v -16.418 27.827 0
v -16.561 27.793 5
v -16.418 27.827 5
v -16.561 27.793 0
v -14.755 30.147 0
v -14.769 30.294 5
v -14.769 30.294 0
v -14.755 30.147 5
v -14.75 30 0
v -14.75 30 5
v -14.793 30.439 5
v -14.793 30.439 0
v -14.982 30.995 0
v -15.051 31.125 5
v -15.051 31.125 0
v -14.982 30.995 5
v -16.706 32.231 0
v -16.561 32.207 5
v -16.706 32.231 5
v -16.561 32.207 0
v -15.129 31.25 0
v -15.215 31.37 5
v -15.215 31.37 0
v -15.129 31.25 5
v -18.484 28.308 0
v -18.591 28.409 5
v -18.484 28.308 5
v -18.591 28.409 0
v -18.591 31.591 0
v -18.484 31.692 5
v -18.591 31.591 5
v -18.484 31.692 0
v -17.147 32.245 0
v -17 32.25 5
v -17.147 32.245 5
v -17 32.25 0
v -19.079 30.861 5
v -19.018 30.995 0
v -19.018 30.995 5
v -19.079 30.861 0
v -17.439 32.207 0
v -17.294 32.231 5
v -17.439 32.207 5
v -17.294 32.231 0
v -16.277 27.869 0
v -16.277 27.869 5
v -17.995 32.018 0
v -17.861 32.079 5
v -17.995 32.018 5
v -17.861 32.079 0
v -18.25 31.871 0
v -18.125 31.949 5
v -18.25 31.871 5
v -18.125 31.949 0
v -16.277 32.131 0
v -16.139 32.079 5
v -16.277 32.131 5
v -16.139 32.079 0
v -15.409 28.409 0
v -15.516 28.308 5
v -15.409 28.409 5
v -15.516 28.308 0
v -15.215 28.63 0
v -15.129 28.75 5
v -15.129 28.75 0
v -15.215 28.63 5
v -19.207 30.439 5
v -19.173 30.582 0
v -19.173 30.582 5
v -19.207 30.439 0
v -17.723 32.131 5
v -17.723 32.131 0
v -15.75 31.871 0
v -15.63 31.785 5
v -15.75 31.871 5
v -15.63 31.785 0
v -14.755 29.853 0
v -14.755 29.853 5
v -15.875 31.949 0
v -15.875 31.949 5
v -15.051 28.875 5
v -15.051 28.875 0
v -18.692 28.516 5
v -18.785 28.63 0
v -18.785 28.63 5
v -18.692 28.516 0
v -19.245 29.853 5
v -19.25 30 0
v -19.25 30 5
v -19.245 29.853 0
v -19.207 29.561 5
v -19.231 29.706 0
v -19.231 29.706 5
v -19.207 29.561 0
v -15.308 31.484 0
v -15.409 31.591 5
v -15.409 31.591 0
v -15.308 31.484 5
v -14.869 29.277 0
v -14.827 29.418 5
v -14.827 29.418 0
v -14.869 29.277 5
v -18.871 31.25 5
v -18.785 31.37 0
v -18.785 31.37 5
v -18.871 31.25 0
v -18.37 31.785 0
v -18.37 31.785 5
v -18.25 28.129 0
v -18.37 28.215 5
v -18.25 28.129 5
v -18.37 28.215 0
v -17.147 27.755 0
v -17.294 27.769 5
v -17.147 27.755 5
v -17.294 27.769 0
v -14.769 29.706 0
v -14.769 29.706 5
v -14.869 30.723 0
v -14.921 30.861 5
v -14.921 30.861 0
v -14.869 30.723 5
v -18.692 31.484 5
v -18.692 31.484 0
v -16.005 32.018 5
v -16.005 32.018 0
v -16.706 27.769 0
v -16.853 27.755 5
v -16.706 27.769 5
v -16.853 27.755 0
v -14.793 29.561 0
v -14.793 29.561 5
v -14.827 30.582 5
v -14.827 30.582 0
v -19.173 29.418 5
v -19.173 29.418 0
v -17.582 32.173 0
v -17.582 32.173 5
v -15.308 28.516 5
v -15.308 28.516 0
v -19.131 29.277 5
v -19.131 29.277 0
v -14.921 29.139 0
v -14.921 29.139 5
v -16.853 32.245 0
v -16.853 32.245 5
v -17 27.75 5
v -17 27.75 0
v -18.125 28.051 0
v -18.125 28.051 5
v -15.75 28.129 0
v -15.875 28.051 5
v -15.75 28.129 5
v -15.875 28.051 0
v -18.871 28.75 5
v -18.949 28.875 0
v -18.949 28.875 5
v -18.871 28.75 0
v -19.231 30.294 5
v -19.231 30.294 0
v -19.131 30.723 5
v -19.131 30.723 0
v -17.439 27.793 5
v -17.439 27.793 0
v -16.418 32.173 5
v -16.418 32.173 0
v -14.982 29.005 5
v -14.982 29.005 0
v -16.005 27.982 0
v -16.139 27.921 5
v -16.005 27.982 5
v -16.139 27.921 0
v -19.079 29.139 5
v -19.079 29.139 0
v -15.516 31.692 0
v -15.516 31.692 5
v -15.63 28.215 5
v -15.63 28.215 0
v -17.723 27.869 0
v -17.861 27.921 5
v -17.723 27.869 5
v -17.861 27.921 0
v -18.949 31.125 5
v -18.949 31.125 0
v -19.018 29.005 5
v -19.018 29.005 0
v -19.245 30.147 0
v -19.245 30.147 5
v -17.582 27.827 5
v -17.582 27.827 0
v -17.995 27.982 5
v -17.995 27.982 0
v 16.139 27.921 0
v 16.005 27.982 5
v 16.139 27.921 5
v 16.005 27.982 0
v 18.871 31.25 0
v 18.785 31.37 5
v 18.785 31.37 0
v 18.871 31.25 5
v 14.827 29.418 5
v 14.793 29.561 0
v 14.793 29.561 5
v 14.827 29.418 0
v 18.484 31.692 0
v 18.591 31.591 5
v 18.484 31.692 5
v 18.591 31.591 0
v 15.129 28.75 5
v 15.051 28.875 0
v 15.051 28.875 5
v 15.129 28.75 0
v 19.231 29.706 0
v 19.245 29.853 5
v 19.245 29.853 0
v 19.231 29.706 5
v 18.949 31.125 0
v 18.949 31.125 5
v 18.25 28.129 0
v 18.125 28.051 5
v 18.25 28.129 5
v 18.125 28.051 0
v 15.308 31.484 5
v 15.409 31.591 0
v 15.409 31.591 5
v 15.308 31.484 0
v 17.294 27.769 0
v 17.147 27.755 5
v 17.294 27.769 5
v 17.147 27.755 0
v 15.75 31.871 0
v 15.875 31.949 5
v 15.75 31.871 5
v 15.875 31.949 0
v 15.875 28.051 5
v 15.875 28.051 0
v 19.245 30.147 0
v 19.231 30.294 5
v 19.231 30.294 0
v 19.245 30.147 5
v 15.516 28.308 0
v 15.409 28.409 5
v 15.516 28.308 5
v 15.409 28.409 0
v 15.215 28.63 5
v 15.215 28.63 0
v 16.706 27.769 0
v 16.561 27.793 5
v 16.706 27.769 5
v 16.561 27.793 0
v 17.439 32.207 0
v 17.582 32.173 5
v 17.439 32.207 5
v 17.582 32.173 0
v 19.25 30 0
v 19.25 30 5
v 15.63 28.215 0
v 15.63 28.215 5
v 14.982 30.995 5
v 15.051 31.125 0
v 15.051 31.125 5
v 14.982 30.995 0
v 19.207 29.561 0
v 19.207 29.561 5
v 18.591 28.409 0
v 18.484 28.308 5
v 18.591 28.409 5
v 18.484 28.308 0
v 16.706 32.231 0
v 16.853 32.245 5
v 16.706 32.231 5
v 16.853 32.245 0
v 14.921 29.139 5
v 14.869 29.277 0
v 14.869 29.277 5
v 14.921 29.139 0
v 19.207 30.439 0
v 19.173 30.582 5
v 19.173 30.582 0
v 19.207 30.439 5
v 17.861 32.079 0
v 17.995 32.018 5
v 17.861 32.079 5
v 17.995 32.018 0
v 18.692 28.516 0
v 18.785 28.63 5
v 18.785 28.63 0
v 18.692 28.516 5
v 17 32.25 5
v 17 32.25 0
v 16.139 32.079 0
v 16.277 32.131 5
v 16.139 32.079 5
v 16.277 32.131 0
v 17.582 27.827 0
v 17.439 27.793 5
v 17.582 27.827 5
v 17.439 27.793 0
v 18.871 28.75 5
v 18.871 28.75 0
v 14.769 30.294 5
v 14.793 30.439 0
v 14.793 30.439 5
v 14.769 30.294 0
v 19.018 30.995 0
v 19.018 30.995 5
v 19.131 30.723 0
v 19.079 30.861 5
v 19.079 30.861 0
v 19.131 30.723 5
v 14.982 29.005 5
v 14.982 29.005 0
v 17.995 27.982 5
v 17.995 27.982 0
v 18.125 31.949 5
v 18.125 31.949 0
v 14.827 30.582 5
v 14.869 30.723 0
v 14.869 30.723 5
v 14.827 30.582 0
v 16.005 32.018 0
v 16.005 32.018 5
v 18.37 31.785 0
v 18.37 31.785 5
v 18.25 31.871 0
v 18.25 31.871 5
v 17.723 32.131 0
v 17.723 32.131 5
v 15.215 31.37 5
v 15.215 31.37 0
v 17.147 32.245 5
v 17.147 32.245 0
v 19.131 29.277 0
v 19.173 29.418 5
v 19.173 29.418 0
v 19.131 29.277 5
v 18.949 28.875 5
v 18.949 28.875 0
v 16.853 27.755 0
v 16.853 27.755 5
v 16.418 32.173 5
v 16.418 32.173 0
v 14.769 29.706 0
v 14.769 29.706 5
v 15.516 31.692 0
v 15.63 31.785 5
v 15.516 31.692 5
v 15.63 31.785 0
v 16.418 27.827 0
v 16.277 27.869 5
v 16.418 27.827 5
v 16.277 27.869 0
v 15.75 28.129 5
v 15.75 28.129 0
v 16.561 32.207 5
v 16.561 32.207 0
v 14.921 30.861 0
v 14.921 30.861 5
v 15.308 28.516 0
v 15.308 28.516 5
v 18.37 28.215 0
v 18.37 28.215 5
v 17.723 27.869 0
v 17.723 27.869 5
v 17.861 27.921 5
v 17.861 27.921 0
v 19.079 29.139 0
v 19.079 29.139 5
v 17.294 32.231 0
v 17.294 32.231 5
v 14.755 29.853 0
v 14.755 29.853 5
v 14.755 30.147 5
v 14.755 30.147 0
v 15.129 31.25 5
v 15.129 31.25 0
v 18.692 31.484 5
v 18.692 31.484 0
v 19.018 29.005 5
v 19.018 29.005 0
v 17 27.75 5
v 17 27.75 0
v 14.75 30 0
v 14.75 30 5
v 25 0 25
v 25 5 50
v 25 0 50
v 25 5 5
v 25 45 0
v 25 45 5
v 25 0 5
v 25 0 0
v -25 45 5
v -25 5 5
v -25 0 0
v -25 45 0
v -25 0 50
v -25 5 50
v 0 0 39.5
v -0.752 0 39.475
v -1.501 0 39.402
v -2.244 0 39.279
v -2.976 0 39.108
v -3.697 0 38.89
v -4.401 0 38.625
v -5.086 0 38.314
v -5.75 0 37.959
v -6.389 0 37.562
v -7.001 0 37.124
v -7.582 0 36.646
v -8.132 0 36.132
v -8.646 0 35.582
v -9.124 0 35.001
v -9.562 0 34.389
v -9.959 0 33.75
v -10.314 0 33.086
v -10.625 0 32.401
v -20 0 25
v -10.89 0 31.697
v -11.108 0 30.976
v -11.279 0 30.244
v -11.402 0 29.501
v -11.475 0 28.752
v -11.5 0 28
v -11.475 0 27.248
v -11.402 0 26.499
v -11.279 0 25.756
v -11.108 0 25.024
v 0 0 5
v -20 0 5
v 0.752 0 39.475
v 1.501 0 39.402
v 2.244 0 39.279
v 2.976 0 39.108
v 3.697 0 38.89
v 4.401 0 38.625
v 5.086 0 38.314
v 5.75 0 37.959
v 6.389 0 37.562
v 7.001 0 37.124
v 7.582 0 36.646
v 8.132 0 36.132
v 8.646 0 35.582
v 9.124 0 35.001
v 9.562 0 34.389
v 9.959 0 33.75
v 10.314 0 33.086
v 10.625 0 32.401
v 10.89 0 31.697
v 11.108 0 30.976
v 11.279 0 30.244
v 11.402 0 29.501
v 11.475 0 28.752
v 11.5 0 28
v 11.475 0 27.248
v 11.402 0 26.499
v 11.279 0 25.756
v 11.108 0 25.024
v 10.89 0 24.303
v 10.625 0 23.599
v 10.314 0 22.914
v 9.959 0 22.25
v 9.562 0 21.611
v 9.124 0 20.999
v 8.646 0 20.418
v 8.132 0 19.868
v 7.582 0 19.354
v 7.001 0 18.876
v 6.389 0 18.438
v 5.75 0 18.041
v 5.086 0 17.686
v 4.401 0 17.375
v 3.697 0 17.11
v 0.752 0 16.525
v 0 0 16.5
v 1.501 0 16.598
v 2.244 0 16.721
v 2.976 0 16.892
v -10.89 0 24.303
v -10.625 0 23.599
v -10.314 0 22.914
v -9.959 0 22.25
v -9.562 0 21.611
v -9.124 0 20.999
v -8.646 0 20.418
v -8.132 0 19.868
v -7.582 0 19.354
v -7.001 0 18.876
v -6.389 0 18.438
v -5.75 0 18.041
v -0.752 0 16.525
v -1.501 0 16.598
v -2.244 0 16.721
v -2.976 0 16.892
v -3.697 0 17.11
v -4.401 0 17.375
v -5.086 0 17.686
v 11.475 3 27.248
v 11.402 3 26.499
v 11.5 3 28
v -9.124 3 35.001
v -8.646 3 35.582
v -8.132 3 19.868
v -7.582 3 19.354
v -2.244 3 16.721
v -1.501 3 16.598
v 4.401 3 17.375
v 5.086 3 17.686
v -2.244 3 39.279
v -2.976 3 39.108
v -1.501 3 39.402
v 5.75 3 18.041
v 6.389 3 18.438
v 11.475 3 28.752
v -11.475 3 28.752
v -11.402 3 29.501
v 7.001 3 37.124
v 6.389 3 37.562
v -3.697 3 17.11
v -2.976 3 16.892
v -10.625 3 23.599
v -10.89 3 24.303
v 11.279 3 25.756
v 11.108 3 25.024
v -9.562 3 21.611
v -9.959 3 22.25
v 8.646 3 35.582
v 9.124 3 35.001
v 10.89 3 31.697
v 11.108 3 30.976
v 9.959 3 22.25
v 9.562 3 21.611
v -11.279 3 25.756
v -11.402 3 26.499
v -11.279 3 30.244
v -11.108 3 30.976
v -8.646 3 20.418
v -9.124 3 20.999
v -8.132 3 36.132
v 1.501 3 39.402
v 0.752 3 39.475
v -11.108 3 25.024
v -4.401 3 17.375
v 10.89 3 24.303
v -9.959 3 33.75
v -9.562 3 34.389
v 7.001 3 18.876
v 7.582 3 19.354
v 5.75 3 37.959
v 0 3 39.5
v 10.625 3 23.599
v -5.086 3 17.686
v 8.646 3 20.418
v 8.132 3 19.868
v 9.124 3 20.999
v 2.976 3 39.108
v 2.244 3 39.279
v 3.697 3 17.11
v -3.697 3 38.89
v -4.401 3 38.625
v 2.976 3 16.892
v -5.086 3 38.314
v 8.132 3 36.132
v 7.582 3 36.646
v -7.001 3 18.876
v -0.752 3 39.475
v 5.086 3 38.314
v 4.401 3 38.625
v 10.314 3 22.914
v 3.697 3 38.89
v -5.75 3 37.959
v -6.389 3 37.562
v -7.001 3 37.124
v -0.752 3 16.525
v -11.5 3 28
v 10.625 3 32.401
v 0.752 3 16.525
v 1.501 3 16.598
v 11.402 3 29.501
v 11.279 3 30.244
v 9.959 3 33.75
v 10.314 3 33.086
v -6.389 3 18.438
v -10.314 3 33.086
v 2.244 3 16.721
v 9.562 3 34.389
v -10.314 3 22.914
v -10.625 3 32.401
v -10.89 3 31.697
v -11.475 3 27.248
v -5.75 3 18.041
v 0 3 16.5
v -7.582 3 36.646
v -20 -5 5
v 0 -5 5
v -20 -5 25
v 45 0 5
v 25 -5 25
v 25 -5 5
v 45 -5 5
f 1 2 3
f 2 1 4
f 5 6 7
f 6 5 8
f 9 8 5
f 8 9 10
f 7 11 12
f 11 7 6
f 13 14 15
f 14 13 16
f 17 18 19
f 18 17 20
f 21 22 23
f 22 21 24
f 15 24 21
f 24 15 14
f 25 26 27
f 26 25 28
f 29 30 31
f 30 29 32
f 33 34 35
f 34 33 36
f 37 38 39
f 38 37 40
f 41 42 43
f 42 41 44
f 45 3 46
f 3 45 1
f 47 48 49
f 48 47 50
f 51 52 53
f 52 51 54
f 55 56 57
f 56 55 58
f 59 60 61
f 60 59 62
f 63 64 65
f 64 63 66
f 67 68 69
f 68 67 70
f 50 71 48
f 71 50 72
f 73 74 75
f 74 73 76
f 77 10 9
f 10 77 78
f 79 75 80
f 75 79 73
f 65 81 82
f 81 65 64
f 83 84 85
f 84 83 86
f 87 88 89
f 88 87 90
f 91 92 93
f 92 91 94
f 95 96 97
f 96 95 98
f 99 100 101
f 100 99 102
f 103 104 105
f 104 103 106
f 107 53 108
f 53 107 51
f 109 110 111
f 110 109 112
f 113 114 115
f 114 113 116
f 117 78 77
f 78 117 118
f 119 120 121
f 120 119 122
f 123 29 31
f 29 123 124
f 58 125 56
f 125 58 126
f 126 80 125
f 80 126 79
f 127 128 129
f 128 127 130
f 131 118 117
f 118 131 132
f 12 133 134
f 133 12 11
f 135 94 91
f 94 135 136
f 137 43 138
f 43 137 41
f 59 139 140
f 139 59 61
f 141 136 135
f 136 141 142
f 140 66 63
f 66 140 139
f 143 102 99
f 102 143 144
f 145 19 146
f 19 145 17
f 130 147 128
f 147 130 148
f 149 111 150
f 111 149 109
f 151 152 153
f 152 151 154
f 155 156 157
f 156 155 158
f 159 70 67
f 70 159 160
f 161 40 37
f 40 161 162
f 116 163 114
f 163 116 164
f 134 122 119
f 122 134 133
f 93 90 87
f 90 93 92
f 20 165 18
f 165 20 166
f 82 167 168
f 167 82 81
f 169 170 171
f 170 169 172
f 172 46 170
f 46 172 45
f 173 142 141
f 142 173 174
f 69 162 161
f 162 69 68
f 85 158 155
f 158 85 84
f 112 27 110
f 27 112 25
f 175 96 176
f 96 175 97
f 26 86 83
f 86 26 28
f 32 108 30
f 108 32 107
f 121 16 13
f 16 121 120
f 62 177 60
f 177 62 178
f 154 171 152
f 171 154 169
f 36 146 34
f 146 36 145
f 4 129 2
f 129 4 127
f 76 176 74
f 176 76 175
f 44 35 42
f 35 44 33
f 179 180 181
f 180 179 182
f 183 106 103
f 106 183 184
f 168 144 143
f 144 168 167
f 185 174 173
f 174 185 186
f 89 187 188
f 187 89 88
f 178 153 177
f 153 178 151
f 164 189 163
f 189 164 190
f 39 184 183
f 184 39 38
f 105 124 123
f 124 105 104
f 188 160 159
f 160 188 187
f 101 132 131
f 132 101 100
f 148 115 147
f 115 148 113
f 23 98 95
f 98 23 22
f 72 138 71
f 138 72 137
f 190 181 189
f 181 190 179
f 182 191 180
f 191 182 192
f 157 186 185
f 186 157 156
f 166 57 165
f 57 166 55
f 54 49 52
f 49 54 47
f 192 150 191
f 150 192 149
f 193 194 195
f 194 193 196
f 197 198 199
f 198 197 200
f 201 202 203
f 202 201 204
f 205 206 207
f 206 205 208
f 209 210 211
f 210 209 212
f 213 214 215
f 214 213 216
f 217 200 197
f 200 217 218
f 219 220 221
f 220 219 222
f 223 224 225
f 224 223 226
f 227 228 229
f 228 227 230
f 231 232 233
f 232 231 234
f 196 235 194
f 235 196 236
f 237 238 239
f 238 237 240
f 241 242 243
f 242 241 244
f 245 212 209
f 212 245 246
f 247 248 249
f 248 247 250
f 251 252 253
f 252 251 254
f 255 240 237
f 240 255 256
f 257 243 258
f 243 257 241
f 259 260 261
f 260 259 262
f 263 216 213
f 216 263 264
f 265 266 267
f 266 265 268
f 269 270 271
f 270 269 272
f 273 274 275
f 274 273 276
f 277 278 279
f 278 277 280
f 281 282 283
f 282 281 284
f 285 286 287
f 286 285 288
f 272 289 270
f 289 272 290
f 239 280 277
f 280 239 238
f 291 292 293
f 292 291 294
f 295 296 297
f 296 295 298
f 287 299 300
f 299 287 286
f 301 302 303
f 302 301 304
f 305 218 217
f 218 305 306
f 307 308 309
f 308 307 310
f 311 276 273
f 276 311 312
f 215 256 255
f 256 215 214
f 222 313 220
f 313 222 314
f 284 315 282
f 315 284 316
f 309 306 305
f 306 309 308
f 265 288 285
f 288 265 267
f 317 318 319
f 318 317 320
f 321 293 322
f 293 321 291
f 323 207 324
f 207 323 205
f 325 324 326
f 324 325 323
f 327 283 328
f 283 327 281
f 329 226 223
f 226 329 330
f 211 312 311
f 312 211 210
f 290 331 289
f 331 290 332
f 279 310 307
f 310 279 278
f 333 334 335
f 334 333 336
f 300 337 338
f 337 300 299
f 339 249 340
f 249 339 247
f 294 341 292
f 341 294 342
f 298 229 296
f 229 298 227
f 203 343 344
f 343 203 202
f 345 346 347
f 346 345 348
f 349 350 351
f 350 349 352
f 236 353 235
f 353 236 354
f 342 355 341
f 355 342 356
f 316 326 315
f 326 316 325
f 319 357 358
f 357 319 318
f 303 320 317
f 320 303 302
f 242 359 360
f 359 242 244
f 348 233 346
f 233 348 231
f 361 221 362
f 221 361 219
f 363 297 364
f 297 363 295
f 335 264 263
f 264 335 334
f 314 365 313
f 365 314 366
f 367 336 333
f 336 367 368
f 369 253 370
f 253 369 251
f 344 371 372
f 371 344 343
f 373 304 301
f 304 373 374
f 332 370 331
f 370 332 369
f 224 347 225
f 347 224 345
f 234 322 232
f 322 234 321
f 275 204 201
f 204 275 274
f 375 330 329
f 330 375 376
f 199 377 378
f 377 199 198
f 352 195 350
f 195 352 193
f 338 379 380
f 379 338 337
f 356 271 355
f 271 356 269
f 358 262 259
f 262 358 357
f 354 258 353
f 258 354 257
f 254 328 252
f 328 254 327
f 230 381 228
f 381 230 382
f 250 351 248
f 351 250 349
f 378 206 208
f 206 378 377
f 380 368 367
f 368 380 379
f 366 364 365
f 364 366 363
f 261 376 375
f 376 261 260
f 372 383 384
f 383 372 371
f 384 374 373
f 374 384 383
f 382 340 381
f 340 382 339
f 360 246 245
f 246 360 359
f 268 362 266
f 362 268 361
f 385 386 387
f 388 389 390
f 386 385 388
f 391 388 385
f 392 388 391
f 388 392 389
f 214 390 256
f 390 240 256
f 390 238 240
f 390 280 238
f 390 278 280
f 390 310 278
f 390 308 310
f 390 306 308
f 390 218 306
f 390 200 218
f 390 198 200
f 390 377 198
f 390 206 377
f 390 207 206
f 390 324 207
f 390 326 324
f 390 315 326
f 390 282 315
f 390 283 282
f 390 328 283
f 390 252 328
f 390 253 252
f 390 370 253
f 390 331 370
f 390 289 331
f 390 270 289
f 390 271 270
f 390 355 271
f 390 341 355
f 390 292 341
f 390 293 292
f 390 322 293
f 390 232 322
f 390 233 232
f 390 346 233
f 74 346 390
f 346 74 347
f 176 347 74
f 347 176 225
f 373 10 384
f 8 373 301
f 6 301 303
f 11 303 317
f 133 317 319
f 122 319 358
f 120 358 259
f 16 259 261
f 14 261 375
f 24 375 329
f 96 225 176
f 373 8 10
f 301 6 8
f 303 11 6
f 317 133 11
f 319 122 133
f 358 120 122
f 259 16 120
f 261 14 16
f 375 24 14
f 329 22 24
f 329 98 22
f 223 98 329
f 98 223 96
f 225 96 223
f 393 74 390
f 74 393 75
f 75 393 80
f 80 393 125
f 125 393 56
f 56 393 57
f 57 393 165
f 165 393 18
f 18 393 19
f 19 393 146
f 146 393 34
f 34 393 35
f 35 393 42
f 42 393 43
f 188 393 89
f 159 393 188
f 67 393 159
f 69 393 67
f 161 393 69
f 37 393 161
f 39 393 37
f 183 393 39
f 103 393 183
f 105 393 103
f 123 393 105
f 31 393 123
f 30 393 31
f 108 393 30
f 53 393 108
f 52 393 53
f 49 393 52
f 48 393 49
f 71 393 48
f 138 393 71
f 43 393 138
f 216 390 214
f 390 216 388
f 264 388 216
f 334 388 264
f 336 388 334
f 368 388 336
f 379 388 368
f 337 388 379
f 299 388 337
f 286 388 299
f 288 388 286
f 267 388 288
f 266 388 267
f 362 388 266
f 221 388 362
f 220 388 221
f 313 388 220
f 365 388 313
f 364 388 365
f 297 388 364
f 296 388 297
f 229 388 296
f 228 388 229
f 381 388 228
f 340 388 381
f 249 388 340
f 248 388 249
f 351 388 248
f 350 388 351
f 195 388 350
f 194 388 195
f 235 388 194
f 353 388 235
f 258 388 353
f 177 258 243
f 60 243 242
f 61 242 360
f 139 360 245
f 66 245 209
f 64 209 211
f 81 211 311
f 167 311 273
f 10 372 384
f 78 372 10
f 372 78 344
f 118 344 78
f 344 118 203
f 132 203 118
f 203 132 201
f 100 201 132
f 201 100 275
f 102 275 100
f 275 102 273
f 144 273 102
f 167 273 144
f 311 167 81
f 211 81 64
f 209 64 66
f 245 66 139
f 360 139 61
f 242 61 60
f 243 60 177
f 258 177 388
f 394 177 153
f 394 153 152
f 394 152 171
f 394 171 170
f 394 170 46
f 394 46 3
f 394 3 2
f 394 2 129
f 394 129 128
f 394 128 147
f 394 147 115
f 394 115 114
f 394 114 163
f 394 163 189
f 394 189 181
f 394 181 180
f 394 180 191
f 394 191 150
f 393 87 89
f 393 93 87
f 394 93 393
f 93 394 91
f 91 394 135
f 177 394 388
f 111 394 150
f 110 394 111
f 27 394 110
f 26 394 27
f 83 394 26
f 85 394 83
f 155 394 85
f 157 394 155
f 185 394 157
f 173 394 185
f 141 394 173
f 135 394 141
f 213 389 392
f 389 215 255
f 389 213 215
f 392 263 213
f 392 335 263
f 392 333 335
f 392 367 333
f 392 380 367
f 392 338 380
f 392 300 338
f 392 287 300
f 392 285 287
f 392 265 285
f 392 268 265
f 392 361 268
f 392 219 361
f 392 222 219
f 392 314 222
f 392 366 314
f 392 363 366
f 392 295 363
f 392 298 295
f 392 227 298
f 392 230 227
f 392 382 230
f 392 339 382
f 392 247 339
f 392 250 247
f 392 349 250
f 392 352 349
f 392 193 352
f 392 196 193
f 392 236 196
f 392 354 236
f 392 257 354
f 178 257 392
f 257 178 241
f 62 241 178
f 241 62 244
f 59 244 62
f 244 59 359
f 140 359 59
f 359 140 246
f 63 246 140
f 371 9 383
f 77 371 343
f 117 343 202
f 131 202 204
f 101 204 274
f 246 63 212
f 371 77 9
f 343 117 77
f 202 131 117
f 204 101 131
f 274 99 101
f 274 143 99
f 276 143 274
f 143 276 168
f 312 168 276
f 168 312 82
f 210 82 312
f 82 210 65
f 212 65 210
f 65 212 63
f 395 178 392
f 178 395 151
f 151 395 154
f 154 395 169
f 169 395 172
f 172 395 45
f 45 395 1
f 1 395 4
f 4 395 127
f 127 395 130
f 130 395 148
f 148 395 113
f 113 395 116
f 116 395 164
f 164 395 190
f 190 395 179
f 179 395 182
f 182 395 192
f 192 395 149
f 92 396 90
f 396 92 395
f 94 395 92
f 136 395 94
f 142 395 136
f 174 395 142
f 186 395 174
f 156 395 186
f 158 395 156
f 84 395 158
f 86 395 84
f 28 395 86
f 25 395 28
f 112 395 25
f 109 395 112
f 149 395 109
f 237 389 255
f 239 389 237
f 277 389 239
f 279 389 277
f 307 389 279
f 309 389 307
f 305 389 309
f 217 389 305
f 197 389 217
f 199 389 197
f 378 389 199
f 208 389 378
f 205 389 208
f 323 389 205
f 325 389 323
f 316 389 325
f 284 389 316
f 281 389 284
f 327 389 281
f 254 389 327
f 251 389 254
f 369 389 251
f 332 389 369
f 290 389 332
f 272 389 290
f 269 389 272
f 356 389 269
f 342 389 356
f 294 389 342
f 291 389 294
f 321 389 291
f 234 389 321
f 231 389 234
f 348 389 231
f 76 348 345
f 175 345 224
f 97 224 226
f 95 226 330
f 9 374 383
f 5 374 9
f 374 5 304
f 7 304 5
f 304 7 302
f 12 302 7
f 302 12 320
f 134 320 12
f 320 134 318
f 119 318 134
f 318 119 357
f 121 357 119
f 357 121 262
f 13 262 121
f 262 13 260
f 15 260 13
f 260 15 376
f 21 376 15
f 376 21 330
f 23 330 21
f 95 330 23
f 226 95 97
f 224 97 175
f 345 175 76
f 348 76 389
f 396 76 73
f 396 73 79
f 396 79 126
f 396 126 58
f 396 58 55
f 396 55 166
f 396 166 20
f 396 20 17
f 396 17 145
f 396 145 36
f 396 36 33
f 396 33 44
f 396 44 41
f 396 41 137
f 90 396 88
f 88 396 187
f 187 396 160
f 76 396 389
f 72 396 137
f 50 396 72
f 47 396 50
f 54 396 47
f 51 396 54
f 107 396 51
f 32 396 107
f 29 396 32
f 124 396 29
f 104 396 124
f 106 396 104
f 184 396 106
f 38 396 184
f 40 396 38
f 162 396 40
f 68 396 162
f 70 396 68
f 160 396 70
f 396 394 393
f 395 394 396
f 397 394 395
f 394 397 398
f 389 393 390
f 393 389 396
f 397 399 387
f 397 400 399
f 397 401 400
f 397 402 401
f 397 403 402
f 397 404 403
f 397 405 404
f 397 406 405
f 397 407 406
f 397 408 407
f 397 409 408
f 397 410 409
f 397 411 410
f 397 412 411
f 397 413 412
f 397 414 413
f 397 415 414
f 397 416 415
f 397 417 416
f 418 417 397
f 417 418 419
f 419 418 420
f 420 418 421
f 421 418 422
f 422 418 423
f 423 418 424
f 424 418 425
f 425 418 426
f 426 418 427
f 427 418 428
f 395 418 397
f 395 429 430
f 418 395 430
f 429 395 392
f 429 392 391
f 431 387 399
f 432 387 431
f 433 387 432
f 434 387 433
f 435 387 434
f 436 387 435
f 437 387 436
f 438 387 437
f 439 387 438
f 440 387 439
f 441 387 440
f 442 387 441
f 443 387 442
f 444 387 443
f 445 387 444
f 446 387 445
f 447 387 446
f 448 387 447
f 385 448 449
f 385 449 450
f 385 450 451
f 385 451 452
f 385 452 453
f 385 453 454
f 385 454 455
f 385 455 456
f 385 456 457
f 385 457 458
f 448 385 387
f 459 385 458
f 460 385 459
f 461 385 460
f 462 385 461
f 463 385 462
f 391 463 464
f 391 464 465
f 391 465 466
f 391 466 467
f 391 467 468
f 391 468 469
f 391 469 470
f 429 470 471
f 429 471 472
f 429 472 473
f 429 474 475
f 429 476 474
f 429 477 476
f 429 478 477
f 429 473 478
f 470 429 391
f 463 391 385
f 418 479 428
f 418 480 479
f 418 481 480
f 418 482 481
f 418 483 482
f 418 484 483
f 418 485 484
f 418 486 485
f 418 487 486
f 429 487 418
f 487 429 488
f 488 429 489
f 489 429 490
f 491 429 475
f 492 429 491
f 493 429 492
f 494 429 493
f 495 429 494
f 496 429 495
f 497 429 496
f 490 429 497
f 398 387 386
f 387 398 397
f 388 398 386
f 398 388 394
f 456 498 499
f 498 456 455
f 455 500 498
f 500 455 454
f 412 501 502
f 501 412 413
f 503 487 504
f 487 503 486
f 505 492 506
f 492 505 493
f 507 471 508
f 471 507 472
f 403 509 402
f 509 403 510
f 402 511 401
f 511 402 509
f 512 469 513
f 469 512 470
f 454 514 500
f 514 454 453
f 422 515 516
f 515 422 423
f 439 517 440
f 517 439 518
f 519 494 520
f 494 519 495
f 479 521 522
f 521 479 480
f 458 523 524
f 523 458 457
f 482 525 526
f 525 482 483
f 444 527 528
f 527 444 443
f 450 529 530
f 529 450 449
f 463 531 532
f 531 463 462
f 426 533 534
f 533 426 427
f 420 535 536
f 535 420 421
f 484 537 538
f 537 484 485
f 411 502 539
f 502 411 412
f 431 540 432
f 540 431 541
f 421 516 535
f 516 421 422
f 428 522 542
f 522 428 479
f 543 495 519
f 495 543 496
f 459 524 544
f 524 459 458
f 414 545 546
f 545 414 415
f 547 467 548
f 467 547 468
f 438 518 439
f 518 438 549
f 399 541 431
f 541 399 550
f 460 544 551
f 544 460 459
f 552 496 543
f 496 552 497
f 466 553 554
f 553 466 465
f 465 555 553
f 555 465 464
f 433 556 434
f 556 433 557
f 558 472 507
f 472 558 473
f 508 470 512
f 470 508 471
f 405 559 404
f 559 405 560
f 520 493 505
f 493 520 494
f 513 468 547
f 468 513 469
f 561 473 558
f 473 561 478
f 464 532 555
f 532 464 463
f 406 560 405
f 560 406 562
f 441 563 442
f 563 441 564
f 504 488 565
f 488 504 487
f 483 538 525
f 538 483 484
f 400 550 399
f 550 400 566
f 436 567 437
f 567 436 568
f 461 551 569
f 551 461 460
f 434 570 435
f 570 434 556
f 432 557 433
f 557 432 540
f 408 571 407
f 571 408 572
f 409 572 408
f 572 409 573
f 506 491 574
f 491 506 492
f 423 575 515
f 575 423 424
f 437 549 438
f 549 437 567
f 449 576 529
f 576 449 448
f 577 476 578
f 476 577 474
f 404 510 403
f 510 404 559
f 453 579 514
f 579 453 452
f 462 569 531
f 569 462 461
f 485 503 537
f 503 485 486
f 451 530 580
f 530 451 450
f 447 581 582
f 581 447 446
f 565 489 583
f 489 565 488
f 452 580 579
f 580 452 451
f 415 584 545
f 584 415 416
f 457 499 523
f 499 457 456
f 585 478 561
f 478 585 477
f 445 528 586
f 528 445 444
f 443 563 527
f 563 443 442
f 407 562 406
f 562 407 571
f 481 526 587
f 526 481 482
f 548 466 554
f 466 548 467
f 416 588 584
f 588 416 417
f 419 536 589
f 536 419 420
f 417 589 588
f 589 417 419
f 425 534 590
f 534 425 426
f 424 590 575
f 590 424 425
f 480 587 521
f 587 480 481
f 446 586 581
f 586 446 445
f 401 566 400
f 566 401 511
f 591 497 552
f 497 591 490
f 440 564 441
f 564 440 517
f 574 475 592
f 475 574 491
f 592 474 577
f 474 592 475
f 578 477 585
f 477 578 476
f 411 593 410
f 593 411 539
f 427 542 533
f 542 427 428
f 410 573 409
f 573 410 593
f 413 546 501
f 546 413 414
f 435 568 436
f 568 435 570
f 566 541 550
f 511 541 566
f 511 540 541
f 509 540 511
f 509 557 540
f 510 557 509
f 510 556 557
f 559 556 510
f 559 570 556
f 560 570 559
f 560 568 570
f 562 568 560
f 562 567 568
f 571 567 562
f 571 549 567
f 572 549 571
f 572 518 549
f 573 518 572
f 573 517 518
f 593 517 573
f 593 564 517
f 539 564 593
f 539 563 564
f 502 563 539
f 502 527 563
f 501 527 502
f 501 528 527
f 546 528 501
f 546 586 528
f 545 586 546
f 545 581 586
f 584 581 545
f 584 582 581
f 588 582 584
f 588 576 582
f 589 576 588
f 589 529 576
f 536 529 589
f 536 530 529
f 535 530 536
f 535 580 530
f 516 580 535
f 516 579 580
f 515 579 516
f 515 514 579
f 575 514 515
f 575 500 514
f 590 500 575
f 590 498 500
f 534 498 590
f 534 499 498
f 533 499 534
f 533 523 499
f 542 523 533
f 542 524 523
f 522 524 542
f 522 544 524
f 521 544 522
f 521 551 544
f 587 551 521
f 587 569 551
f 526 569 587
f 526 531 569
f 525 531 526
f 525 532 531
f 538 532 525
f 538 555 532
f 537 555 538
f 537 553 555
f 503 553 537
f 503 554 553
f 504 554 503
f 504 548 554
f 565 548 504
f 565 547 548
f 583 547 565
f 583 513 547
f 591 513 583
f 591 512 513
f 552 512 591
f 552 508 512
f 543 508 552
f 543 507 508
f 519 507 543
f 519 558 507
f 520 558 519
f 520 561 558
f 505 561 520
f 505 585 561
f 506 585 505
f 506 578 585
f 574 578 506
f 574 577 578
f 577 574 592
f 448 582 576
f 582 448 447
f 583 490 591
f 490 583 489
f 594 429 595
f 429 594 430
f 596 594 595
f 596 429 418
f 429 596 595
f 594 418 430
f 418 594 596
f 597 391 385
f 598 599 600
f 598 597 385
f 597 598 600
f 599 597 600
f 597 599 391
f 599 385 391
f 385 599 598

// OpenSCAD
// L-shaped mounting bracket for NEMA 17 stepper motor (e.g. syringe pump)
// Print orientation: base plate on bed, vertical motor plate builds up in +Z

// ---------------- Parameters ----------------
base_x      = 25;    // base plate half-length in X
base_y      = 45;    // base plate length in Y
base_t      = 5;     // base plate thickness in Z

hole_m4_x   = 17;    // M4 through-hole offset from centre in X (both holes)
hole_m4_y   = 30;    // M4 through-hole position in Y
hole_m4_d   = 4.5;   // M4 through-hole diameter

motor_h     = 50;    // vertical motor plate height in Z
motor_w     = 5;     // vertical motor plate thickness in Y
boss_d      = 23;    // motor centring boss hole diameter
boss_x      = 0;     // boss hole centre X
boss_z      = 28;    // boss hole centre Z
screw_d     = 3.4;   // M3 screw hole diameter
screw_p     = 31;    // square pattern side length for screw holes

gusset_t    = 5;     // gusset thickness along X
gusset_leg  = 20;    // right-triangle leg length along Y and Z
gusset_y    = 5;     // gusset corner position in Y
gusset_z    = 5;     // gusset corner position in Z

eps         = 0.5;   // cutter overshoot past faces

$fn = 96;            // curve resolution

// ---------------- Model ----------------
union() {
    // Base plate with M4 through-holes
    difference() {
        translate([-base_x, 0, 0])
            cube([2 * base_x, base_y, base_t]);
        for (sx = [-1, 1])
            translate([sx * hole_m4_x, hole_m4_y, -eps])
                cylinder(d = hole_m4_d, h = base_t + 2 * eps);
    }

    // Vertical motor plate, standing on the back edge of the base
    difference() {
        translate([-base_x, 0, 0])
            cube([2 * base_x, motor_w, motor_h]);
        // Motor centring boss hole
        translate([boss_x, -motor_w / 2 - eps, boss_z])
            rotate([-90, 0, 0])
                cylinder(d = boss_d, h = motor_w + 2 * eps);
        // M3 screw holes on a square pattern centred on the boss hole
        for (a = [0, 90, 180, 270])
            rotate([0, 0, a])
                translate([screw_p / 2, screw_p / 2, 0])
                    cylinder(d = screw_d, h = motor_h + 1);
    }

    // Triangular gussets flush with the left and right edges
    // Right triangle in the YZ plane: legs along +Y and +Z, right angle at (y = 5, z = 5)
    for (sx = [-1, 1]) {
        x0 = sx > 0 ? 20 : -25;   // gusset start in X
        translate([x0, 0, 0])
            rotate([90, 0, 0])
                linear_extrude(height = gusset_t)
                    polygon(points = [
                        [gusset_y, gusset_z],
                        [gusset_y + gusset_leg, gusset_z],
                        [gusset_y, gusset_z + gusset_leg]
                    ]);
    }
}
